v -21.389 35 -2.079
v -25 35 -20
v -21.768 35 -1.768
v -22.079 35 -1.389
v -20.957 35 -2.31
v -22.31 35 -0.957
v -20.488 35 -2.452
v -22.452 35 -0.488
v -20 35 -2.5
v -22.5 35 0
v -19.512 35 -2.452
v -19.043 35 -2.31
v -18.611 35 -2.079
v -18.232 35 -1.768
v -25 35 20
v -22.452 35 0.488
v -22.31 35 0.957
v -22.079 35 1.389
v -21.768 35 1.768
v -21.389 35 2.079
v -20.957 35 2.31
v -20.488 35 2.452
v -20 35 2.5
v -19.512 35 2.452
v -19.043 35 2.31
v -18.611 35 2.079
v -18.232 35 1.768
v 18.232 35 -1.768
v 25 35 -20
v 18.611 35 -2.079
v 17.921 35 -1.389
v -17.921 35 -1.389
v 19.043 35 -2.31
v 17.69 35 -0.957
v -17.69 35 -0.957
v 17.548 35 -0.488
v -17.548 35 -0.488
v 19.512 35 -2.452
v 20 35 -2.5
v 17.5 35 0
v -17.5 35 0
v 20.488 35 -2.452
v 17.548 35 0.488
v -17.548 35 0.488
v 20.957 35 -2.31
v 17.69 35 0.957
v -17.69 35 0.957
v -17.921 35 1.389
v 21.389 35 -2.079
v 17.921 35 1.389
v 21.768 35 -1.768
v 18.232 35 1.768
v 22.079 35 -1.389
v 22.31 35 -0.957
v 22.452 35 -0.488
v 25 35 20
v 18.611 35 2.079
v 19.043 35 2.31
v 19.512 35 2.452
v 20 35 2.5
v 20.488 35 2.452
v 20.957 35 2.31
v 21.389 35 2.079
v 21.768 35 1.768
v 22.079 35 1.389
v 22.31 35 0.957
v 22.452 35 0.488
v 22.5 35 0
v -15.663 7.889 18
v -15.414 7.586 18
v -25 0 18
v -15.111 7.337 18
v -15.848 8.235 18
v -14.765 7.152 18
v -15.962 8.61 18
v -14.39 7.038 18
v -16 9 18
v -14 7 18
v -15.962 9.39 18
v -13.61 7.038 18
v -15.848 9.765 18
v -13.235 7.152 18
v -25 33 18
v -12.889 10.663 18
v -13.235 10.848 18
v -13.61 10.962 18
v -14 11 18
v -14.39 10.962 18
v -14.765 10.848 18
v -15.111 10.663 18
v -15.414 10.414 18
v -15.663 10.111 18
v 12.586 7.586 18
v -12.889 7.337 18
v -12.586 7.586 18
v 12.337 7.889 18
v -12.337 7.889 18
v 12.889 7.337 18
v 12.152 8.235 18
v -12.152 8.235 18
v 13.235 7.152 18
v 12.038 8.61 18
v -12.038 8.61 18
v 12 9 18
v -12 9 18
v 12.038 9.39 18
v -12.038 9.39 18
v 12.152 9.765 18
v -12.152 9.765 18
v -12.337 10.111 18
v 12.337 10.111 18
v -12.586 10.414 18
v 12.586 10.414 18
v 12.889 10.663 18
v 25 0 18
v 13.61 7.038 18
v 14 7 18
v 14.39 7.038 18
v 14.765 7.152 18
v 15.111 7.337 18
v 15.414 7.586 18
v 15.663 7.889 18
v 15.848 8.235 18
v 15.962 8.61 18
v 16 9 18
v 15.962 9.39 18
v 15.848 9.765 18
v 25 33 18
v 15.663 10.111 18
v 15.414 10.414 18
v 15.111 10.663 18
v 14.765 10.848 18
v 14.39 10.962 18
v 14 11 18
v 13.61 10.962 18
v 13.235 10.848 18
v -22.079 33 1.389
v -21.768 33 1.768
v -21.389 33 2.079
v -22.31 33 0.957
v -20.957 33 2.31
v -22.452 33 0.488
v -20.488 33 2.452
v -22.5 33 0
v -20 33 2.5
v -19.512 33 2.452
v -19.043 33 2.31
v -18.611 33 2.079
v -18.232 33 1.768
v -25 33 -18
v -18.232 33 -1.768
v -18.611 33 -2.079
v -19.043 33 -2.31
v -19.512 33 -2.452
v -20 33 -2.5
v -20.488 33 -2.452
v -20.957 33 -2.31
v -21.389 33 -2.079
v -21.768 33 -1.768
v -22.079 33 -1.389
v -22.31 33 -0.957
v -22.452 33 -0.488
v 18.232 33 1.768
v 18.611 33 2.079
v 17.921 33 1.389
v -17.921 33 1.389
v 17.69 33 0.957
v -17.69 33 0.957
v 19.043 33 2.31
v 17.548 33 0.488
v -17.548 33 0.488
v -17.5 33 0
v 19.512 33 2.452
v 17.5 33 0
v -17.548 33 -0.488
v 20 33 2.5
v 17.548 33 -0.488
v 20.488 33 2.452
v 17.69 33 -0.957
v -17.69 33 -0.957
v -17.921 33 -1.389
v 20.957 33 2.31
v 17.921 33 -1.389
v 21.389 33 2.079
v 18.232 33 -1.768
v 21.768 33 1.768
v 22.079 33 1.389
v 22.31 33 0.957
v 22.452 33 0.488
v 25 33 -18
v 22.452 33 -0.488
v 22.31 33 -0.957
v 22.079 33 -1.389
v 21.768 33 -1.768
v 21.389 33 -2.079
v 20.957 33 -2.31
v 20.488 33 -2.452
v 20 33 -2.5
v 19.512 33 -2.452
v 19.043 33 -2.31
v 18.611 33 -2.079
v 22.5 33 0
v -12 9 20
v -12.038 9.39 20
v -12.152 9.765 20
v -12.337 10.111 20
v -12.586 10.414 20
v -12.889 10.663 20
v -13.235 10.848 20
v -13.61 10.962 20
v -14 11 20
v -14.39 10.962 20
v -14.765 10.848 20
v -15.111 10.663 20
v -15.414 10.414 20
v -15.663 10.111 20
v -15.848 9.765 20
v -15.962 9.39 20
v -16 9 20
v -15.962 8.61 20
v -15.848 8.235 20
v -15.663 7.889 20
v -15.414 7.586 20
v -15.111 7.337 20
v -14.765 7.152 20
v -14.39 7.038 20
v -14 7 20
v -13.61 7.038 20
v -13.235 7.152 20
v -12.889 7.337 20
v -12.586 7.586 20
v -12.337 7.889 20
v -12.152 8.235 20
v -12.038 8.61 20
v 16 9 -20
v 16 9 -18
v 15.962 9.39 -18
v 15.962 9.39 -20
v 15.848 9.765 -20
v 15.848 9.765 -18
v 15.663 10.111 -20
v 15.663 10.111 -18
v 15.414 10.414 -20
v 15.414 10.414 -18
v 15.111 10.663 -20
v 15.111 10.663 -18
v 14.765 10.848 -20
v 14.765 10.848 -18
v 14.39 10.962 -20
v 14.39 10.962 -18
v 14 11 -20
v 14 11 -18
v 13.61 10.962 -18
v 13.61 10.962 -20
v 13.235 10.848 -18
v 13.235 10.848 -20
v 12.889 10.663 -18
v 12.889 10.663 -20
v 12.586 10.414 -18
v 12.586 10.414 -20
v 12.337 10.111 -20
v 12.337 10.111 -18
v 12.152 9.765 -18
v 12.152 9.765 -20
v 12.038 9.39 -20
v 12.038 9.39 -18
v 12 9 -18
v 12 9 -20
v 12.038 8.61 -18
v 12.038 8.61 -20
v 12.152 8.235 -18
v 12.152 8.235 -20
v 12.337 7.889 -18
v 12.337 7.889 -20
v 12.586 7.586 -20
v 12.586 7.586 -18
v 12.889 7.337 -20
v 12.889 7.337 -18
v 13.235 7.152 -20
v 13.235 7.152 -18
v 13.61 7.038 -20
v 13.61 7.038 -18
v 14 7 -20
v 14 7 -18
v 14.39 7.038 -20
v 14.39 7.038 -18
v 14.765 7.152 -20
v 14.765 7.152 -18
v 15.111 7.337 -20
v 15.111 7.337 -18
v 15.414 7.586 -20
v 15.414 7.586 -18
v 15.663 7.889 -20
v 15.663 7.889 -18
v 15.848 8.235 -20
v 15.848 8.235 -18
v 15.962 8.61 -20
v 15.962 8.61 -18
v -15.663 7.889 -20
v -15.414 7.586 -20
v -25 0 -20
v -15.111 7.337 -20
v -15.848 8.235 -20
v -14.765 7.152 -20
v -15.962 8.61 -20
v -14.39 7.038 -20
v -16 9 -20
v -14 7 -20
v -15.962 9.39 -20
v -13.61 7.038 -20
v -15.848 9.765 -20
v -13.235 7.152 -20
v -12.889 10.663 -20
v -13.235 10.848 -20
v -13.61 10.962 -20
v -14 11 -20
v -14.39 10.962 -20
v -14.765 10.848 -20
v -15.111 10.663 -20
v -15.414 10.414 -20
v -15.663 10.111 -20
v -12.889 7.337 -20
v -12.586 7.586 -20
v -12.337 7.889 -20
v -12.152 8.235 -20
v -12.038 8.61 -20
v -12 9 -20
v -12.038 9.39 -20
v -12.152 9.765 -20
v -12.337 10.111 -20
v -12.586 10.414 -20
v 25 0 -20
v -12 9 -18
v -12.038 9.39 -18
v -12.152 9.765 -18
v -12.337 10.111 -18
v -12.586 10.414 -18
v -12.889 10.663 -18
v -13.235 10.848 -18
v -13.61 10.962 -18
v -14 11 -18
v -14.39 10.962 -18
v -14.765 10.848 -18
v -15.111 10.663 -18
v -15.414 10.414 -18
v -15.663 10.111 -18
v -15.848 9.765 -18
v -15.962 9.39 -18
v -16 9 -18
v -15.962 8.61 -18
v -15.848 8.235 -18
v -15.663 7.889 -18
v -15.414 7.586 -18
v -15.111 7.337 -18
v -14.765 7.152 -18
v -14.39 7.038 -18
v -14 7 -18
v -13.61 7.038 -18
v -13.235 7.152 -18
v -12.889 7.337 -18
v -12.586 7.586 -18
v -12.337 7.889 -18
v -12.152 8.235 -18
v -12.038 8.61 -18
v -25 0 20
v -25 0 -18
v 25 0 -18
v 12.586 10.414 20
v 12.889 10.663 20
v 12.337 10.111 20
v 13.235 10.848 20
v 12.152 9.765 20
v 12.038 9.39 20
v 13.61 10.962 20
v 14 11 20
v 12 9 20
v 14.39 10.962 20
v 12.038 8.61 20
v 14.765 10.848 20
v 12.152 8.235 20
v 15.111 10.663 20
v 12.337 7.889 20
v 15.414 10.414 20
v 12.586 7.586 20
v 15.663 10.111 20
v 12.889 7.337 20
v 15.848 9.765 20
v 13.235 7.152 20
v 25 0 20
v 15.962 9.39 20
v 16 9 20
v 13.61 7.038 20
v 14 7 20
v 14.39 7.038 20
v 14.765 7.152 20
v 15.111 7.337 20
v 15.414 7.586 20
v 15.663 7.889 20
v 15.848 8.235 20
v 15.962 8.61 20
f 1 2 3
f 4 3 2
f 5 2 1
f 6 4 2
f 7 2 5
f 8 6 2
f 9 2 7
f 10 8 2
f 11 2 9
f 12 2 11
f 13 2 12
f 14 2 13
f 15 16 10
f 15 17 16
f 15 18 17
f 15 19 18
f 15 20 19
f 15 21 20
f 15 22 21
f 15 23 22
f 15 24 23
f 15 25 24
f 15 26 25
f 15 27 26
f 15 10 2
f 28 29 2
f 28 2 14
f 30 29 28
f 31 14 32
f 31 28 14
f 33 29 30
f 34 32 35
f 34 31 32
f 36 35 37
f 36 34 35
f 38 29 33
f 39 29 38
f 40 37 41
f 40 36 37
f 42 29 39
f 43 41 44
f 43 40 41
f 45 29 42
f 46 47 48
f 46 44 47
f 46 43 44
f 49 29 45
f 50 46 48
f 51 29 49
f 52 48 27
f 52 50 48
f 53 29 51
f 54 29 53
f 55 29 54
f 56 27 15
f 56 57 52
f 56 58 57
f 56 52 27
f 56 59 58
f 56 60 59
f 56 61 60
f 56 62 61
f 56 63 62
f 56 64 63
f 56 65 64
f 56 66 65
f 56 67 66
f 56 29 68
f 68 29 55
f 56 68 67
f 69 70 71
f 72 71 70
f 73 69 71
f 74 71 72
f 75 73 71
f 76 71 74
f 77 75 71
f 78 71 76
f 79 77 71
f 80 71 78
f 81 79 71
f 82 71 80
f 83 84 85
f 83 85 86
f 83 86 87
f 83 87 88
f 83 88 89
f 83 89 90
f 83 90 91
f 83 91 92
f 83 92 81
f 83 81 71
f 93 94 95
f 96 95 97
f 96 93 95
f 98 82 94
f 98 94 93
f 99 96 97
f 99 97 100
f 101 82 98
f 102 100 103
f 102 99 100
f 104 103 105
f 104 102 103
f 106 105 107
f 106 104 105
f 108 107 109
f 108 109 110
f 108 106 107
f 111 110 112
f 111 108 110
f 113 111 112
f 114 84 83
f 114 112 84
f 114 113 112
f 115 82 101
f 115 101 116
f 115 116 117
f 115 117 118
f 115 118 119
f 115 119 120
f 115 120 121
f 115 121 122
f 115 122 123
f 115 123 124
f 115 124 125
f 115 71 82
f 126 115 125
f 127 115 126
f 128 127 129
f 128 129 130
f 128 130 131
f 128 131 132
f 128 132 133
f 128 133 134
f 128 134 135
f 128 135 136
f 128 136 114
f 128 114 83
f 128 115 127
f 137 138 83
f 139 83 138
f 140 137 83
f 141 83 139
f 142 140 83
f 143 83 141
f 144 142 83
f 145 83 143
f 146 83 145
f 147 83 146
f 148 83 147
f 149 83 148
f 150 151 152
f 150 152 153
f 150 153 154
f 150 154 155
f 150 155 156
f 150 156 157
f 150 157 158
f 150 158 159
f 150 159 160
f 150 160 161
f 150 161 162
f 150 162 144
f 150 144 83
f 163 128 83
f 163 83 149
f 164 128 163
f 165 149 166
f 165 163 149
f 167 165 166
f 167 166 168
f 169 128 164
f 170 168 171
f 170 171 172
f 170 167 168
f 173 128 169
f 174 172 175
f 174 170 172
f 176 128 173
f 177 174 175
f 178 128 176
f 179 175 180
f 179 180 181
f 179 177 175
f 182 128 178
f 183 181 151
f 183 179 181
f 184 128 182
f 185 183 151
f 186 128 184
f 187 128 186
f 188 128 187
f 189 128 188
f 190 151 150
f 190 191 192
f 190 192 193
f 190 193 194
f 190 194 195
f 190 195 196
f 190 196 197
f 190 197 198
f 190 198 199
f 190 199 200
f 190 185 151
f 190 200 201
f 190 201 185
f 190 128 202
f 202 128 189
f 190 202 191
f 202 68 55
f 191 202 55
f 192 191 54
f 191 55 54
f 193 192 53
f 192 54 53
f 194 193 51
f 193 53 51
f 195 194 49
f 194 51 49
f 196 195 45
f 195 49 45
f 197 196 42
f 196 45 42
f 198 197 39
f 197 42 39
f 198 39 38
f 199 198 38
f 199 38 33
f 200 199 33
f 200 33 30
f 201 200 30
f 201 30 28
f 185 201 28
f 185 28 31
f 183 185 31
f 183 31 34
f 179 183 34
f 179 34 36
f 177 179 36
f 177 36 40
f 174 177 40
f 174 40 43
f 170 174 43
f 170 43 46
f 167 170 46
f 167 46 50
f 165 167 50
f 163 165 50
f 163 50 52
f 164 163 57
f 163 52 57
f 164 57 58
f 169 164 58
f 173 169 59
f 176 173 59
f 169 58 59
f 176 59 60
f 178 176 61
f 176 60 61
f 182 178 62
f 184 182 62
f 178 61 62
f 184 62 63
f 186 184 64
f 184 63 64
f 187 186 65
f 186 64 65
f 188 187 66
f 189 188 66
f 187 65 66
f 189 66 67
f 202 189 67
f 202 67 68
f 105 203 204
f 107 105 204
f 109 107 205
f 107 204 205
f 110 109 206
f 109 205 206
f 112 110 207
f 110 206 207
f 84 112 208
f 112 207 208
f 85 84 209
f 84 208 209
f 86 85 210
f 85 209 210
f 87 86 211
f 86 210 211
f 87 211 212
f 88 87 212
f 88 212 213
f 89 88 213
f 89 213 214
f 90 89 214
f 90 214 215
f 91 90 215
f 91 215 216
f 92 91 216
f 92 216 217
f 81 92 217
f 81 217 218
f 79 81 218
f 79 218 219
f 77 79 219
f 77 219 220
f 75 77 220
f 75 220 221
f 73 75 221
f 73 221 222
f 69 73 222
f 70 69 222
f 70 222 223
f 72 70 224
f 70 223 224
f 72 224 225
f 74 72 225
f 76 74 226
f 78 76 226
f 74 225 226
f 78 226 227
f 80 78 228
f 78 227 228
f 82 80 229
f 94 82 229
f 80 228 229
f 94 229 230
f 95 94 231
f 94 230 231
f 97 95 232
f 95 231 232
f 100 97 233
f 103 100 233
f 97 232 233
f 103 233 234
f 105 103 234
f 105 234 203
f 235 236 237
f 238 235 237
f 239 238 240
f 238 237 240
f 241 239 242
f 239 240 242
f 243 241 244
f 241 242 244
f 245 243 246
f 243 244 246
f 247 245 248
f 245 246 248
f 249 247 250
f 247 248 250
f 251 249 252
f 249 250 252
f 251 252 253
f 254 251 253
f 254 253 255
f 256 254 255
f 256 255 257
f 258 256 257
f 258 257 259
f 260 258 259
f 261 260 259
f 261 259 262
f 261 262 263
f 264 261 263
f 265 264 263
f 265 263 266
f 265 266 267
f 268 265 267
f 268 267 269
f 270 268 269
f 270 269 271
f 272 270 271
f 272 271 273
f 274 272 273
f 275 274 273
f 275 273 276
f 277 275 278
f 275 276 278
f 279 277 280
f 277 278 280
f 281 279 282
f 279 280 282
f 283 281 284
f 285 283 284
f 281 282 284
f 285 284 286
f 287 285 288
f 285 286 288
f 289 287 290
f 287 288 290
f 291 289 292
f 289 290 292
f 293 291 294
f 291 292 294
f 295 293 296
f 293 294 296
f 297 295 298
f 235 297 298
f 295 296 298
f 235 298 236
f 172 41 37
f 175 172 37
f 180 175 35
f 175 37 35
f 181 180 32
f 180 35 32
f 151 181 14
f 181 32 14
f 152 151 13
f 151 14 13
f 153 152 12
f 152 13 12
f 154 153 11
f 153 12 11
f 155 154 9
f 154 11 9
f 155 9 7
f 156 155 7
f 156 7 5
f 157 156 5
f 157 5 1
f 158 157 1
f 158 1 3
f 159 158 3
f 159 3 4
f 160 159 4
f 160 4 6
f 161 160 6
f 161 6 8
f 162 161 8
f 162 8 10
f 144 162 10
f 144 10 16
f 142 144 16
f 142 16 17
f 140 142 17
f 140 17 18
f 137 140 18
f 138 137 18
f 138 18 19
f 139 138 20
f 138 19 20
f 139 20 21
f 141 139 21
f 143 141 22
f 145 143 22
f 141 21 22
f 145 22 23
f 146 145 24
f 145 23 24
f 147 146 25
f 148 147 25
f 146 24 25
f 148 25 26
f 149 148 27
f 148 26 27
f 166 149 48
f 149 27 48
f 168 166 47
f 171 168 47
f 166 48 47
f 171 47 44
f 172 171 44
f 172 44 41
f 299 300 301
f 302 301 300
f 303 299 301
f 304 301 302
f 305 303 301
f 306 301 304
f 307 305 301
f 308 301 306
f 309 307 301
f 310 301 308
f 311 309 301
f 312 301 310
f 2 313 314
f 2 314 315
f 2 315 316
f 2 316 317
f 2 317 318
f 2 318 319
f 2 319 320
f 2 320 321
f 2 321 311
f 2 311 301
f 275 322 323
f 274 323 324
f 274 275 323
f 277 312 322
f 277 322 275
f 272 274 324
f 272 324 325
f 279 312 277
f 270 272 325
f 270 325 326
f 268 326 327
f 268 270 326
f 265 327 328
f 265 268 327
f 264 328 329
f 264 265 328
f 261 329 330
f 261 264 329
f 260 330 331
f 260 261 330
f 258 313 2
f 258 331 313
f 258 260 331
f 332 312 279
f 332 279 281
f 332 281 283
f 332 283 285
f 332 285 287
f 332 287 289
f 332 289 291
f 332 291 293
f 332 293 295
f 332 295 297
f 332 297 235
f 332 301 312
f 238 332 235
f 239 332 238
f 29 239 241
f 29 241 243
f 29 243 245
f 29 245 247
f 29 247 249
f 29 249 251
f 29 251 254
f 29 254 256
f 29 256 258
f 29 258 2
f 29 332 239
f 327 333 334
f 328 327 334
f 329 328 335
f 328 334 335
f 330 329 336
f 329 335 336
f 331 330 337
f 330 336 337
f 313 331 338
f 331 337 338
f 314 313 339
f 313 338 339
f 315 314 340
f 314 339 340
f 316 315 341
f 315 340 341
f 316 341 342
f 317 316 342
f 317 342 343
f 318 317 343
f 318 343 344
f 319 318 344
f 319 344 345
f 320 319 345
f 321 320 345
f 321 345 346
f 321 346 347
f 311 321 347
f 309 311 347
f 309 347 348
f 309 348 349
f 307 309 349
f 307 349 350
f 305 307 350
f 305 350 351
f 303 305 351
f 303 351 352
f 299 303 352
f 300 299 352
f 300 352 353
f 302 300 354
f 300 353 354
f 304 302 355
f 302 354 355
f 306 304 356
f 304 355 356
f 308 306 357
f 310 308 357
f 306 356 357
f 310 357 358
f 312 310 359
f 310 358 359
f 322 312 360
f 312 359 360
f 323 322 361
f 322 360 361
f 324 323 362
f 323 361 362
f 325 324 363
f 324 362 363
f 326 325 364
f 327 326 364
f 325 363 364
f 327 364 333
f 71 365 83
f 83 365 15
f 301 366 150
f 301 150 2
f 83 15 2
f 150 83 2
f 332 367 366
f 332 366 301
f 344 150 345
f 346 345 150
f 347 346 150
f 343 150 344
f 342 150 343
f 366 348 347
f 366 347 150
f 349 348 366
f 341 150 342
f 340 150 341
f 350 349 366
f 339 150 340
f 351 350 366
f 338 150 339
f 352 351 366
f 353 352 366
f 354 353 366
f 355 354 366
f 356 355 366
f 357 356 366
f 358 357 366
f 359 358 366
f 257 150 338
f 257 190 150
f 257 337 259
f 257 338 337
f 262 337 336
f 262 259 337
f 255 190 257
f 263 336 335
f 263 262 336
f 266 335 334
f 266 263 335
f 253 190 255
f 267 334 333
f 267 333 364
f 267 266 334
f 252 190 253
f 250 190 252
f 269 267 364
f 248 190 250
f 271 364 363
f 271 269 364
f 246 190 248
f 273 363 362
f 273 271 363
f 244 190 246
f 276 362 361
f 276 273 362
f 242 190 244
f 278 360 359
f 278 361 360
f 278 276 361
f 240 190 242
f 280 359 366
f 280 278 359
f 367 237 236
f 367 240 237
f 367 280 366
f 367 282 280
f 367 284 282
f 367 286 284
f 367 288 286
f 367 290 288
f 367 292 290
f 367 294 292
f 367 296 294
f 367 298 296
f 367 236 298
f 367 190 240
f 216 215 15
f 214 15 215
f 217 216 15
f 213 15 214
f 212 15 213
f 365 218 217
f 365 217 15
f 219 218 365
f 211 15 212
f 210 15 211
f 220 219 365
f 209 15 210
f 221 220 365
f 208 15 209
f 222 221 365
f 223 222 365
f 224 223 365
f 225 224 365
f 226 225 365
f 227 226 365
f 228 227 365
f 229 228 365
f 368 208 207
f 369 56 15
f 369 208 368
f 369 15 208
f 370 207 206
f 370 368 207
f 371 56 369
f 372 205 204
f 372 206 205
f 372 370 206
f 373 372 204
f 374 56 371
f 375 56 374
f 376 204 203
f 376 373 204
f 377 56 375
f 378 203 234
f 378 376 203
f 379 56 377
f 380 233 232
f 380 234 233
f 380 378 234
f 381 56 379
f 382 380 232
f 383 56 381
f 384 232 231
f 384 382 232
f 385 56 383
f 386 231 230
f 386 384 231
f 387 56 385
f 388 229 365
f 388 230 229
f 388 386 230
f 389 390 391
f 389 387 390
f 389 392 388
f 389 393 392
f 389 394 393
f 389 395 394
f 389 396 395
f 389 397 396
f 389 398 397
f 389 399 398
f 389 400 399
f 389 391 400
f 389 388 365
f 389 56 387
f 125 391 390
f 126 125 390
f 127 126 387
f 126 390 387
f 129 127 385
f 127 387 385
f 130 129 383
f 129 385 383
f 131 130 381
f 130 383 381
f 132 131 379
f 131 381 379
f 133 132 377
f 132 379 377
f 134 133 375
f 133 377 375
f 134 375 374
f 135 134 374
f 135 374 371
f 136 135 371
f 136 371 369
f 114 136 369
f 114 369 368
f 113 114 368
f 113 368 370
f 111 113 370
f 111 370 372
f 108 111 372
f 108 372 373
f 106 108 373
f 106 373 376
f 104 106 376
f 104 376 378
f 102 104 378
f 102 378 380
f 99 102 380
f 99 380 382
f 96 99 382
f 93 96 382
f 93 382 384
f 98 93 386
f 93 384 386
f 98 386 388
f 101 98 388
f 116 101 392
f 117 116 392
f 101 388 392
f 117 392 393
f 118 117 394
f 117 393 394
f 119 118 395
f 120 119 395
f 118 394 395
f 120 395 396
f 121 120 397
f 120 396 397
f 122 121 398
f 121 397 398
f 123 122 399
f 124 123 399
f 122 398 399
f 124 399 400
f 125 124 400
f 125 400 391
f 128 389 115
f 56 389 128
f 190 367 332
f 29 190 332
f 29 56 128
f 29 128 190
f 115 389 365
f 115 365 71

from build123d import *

# Parameters (mm, degrees)
EXTRUDE_1_DEPTH     = 25
SKETCH_2_R          = 2
CUT_EXTRUDE_1_DEPTH = 41
SKETCH_3_R          = 2.5
CUT_EXTRUDE_2_DEPTH = 10


with BuildPart() as part:
    # 草图1 → 凸台-拉伸1 (new body, symmetric)
    with BuildSketch(Plane(origin=(0, 0, 0), x_dir=(0, 0, -1), z_dir=(1, 0, 0))):
        Polygon((18, 33), (18, 0), (20, 0), (20, 35), (-20, 35), (-20, 0), (-18, 0), (-18, 33), align=None)
    extrude(amount=EXTRUDE_1_DEPTH, both=True)

    # 草图2 → 切除-拉伸1 (cut, through all)
    with BuildSketch(Plane.XY.offset(20)):
        with Locations((-14, 9)):
            Circle(SKETCH_2_R)
        with Locations((14, 9)):
            Circle(SKETCH_2_R)
    extrude(amount=-CUT_EXTRUDE_1_DEPTH, mode=Mode.SUBTRACT)

    # 草图3 → 切除-拉伸2 (cut)
    with BuildSketch(Plane(origin=(0, 35, 0), x_dir=(1, 0, 0), z_dir=(0, 1, 0))):
        with Locations((-20, 0)):
            Circle(SKETCH_3_R)
        with Locations((20, 0)):
            Circle(SKETCH_3_R)
    extrude(amount=-CUT_EXTRUDE_2_DEPTH, mode=Mode.SUBTRACT)


solid = part.part
